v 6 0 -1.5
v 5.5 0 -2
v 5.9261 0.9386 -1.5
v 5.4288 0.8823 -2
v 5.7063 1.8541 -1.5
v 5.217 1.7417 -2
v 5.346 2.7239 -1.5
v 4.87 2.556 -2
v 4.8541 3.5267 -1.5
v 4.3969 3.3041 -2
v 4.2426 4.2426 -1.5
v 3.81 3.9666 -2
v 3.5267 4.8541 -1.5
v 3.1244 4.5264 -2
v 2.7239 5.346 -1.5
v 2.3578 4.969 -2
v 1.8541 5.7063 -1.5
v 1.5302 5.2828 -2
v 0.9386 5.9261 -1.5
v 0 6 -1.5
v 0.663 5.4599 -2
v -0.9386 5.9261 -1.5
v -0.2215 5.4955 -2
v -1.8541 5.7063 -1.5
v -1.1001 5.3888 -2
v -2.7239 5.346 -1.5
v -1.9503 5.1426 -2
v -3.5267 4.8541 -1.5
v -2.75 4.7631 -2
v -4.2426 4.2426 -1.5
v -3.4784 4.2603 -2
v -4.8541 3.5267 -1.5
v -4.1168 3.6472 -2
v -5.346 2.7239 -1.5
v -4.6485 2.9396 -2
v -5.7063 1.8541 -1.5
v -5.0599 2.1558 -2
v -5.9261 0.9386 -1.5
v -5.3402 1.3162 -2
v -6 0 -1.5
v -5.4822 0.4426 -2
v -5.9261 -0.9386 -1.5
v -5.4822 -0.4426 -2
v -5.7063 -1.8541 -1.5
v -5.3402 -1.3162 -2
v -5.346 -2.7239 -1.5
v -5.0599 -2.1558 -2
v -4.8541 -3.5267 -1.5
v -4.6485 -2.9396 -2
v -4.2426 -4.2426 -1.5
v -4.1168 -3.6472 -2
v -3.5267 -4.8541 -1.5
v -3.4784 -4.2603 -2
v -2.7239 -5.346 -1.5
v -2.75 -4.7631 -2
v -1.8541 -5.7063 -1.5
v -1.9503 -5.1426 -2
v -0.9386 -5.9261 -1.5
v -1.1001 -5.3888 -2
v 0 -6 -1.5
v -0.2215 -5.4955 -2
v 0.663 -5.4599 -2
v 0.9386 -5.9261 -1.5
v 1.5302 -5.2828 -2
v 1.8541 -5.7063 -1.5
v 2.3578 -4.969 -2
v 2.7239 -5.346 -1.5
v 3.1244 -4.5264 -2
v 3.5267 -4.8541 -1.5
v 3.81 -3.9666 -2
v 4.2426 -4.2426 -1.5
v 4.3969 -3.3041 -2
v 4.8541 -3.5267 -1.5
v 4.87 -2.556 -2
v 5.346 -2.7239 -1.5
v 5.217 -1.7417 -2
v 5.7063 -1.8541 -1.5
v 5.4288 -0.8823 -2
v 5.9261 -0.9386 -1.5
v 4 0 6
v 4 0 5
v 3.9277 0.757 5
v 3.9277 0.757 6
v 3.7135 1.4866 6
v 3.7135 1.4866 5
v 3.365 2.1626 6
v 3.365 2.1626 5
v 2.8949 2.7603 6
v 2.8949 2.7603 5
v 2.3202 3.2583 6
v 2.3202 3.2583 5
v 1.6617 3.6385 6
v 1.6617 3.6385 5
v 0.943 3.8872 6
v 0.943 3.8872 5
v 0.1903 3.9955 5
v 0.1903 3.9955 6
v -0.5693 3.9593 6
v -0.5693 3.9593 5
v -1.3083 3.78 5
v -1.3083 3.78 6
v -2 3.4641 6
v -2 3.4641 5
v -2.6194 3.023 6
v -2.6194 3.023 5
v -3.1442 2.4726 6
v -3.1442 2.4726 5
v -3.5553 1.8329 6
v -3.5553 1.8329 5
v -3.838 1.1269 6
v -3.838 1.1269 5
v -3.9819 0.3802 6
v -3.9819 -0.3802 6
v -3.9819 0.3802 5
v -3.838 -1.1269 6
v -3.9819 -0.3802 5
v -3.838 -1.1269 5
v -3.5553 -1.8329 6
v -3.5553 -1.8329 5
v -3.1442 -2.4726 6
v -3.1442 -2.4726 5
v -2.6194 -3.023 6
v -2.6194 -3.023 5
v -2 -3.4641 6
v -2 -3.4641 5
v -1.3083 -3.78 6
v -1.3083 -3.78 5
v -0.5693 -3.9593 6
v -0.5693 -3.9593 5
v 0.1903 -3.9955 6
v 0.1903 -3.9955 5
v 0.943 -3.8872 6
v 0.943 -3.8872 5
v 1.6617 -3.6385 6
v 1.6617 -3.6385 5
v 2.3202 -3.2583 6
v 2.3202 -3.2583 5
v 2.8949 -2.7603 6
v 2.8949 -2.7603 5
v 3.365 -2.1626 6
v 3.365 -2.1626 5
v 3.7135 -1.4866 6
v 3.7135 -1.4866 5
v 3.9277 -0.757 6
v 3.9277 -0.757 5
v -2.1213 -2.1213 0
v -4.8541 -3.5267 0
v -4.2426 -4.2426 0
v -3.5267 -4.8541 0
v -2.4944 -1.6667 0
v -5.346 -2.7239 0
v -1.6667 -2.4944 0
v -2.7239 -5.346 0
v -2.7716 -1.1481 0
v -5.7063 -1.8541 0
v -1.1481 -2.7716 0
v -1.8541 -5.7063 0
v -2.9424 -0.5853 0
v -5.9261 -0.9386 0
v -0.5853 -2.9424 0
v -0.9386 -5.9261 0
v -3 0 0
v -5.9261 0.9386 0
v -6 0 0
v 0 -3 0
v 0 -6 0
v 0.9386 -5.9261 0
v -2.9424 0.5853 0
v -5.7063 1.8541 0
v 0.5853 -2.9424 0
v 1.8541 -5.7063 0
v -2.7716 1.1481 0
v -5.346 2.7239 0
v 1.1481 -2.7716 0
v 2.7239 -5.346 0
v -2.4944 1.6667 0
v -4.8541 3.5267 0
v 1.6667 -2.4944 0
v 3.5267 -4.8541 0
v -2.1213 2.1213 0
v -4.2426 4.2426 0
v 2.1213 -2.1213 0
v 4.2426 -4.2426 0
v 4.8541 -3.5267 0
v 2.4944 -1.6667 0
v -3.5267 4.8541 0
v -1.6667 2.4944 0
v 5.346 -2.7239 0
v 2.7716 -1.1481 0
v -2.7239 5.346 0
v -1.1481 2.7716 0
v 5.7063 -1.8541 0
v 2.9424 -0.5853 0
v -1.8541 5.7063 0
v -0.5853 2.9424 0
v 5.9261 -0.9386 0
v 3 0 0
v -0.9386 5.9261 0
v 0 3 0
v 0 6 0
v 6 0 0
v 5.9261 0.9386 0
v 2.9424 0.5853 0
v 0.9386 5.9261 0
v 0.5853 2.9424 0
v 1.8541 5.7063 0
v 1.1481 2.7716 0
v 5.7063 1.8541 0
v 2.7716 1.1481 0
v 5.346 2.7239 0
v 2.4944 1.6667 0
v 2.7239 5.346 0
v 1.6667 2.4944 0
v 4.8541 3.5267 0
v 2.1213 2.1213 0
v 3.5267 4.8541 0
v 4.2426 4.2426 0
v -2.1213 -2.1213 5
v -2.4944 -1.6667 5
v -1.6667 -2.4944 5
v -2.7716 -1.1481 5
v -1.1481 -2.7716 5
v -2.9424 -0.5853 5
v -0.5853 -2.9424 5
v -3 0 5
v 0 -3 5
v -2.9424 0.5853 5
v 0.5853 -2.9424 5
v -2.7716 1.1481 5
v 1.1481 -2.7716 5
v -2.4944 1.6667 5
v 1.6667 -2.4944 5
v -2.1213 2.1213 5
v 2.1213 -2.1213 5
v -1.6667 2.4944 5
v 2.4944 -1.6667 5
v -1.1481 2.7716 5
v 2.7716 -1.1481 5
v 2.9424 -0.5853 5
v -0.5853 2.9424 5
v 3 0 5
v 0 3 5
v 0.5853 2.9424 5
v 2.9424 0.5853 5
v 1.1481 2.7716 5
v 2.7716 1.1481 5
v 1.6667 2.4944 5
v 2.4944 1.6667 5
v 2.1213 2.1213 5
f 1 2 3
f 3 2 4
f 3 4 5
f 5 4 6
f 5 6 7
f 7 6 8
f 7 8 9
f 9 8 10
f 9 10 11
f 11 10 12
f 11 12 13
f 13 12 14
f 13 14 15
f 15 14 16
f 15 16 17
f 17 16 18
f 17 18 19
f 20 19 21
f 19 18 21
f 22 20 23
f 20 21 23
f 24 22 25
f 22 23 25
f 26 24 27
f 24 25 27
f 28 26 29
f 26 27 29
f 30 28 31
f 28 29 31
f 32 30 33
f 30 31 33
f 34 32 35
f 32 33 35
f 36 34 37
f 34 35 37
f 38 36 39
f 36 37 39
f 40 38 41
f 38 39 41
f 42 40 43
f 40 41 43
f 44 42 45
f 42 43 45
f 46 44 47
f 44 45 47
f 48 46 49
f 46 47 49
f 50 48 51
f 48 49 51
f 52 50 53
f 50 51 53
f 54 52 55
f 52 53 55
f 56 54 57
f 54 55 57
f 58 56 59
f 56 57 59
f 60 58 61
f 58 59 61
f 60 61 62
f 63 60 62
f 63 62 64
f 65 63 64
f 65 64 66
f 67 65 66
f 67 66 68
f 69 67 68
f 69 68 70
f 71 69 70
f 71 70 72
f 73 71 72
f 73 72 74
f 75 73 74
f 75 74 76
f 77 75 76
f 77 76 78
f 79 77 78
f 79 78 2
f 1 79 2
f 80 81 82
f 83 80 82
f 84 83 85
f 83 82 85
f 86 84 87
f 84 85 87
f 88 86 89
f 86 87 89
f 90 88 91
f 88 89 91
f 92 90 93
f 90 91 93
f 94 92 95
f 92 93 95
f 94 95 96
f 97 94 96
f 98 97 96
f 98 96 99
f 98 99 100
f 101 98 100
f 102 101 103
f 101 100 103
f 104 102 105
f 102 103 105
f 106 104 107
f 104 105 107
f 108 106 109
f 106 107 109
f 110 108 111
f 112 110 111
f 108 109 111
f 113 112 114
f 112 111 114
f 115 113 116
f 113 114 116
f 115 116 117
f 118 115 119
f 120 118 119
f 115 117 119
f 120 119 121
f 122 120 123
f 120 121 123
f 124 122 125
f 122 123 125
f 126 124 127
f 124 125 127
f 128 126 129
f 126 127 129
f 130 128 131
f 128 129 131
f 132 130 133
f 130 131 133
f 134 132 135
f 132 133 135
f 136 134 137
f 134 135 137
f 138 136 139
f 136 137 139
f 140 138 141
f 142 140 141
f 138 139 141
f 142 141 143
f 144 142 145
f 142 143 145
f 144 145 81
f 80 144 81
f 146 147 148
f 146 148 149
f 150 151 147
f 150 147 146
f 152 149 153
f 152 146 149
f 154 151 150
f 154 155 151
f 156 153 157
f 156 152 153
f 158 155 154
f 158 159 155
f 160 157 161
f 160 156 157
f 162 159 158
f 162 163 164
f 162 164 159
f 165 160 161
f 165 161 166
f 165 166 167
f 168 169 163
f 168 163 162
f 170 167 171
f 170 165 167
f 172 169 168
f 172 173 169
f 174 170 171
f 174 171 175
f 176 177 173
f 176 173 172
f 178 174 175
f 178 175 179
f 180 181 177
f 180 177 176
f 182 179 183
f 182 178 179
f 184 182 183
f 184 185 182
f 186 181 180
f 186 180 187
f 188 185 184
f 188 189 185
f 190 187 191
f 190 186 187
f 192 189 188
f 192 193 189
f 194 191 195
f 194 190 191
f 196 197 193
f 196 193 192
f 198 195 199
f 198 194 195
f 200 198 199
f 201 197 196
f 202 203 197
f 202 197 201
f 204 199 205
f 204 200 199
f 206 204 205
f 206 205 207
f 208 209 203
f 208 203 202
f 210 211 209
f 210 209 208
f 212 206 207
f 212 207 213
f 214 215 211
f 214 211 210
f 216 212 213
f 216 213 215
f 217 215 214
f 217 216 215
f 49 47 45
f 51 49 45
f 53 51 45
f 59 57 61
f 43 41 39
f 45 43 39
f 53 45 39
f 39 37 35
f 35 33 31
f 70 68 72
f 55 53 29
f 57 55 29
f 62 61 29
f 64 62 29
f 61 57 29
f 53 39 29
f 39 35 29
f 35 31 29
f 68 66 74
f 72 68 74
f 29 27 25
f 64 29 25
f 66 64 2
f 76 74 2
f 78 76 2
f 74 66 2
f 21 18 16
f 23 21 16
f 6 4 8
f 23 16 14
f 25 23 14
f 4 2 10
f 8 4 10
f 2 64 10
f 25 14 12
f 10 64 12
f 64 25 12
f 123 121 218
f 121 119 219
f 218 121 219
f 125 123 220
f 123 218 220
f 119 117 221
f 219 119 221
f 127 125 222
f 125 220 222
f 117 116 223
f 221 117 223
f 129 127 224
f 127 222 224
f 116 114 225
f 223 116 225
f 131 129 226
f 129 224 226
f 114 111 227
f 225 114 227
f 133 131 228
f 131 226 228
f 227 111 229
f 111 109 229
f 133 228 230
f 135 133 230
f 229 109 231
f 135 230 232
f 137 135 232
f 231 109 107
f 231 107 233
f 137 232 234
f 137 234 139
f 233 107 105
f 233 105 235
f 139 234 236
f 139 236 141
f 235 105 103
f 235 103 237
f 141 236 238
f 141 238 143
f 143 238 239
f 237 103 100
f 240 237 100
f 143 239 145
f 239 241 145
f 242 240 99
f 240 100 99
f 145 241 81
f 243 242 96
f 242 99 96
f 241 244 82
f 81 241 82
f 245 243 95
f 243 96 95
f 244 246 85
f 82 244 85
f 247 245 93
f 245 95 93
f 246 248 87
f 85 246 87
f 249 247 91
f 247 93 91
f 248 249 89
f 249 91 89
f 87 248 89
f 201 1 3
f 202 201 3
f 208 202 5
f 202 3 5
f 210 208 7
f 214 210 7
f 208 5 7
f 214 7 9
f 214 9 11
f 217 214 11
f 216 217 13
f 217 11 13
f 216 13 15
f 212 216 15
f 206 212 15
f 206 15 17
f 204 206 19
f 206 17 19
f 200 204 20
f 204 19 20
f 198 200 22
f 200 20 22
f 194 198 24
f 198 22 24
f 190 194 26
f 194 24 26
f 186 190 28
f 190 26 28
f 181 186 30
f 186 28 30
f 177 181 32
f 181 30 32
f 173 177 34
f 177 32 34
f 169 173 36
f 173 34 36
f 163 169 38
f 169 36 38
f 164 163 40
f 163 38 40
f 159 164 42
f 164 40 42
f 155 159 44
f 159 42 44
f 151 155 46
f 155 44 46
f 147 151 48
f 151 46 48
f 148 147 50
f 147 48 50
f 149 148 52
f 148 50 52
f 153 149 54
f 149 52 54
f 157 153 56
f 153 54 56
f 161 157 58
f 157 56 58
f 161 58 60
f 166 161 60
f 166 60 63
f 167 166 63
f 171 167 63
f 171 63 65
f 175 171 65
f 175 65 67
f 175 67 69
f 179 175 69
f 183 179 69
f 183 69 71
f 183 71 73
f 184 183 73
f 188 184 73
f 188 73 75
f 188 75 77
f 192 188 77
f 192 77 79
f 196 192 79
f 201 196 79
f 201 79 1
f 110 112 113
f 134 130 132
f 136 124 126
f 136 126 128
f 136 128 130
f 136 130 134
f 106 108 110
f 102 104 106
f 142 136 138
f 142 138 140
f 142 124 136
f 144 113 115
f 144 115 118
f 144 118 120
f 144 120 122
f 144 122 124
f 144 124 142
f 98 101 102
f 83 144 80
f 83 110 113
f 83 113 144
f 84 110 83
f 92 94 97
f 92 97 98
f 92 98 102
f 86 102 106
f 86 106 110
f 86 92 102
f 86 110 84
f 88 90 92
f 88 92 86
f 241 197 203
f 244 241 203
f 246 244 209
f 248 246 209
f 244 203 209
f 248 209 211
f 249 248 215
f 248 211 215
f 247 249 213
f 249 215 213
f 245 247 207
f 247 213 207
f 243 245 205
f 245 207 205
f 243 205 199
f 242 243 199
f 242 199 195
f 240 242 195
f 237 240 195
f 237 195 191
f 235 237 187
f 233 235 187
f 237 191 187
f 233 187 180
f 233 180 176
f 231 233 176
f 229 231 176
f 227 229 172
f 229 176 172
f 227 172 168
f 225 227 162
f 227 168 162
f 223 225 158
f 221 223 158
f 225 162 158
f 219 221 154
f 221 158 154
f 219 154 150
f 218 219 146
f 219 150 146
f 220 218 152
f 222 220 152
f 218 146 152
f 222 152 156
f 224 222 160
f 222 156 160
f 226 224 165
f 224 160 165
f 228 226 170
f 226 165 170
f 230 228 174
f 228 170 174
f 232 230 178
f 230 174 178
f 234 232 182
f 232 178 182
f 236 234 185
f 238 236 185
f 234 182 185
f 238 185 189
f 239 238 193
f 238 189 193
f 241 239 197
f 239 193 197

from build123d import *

# Parameters (mm, degrees)
SKETCH1_R           = 3
BOSS_EXTRUDE1_DEPTH = 5
BOSS_EXTRUDE2_START = 5
SKETCH1_3_R         = 4
SKETCH1_3_R_2       = 3
BOSS_EXTRUDE2_DEPTH = 1
BOSS_EXTRUDE3_START = -2
SKETCH1_4_R         = 6
SKETCH1_4_R_2       = 4
SKETCH1_4_R_3       = 3
BOSS_EXTRUDE3_DEPTH = 2
CHAMFER1_SIZE       = 0.5


with BuildPart() as part:
    # Sketch1 → Boss-Extrude1 (new body)
    with BuildSketch(Plane.XY):
        Circle(SKETCH1_R)
    extrude(amount=BOSS_EXTRUDE1_DEPTH)

    # Sketch1<3> → Boss-Extrude2 (add)
    # profile 1 of 2: a face of its own
    with BuildSketch(Plane.XY.offset(BOSS_EXTRUDE2_START)):
        Circle(SKETCH1_3_R)
        Circle(SKETCH1_3_R_2, mode=Mode.SUBTRACT)
    # profile 2 of 2: a face of its own
    with BuildSketch(Plane.XY.offset(BOSS_EXTRUDE2_START)):
        Circle(SKETCH1_3_R_2)
    extrude(amount=BOSS_EXTRUDE2_DEPTH)

    # Sketch1<4> → Boss-Extrude3 (add)
    # profile 1 of 3: a face of its own
    with BuildSketch(Plane.XY.offset(BOSS_EXTRUDE3_START)):
        Circle(SKETCH1_4_R)
        Circle(SKETCH1_4_R_2, mode=Mode.SUBTRACT)
    # profile 2 of 3: a face of its own
    with BuildSketch(Plane.XY.offset(BOSS_EXTRUDE3_START)):
        Circle(SKETCH1_4_R_2)
        Circle(SKETCH1_4_R_3, mode=Mode.SUBTRACT)
    # profile 3 of 3: a face of its own
    with BuildSketch(Plane.XY.offset(BOSS_EXTRUDE3_START)):
        Circle(SKETCH1_4_R_3)
    extrude(amount=BOSS_EXTRUDE3_DEPTH)

    # Chamfer1
    chamfer1_edges = [part.edges().sort_by_distance(p)[0] for p in [
        (-6, 0, -2),
    ]]
    chamfer(chamfer1_edges, length=CHAMFER1_SIZE)


solid = part.part
